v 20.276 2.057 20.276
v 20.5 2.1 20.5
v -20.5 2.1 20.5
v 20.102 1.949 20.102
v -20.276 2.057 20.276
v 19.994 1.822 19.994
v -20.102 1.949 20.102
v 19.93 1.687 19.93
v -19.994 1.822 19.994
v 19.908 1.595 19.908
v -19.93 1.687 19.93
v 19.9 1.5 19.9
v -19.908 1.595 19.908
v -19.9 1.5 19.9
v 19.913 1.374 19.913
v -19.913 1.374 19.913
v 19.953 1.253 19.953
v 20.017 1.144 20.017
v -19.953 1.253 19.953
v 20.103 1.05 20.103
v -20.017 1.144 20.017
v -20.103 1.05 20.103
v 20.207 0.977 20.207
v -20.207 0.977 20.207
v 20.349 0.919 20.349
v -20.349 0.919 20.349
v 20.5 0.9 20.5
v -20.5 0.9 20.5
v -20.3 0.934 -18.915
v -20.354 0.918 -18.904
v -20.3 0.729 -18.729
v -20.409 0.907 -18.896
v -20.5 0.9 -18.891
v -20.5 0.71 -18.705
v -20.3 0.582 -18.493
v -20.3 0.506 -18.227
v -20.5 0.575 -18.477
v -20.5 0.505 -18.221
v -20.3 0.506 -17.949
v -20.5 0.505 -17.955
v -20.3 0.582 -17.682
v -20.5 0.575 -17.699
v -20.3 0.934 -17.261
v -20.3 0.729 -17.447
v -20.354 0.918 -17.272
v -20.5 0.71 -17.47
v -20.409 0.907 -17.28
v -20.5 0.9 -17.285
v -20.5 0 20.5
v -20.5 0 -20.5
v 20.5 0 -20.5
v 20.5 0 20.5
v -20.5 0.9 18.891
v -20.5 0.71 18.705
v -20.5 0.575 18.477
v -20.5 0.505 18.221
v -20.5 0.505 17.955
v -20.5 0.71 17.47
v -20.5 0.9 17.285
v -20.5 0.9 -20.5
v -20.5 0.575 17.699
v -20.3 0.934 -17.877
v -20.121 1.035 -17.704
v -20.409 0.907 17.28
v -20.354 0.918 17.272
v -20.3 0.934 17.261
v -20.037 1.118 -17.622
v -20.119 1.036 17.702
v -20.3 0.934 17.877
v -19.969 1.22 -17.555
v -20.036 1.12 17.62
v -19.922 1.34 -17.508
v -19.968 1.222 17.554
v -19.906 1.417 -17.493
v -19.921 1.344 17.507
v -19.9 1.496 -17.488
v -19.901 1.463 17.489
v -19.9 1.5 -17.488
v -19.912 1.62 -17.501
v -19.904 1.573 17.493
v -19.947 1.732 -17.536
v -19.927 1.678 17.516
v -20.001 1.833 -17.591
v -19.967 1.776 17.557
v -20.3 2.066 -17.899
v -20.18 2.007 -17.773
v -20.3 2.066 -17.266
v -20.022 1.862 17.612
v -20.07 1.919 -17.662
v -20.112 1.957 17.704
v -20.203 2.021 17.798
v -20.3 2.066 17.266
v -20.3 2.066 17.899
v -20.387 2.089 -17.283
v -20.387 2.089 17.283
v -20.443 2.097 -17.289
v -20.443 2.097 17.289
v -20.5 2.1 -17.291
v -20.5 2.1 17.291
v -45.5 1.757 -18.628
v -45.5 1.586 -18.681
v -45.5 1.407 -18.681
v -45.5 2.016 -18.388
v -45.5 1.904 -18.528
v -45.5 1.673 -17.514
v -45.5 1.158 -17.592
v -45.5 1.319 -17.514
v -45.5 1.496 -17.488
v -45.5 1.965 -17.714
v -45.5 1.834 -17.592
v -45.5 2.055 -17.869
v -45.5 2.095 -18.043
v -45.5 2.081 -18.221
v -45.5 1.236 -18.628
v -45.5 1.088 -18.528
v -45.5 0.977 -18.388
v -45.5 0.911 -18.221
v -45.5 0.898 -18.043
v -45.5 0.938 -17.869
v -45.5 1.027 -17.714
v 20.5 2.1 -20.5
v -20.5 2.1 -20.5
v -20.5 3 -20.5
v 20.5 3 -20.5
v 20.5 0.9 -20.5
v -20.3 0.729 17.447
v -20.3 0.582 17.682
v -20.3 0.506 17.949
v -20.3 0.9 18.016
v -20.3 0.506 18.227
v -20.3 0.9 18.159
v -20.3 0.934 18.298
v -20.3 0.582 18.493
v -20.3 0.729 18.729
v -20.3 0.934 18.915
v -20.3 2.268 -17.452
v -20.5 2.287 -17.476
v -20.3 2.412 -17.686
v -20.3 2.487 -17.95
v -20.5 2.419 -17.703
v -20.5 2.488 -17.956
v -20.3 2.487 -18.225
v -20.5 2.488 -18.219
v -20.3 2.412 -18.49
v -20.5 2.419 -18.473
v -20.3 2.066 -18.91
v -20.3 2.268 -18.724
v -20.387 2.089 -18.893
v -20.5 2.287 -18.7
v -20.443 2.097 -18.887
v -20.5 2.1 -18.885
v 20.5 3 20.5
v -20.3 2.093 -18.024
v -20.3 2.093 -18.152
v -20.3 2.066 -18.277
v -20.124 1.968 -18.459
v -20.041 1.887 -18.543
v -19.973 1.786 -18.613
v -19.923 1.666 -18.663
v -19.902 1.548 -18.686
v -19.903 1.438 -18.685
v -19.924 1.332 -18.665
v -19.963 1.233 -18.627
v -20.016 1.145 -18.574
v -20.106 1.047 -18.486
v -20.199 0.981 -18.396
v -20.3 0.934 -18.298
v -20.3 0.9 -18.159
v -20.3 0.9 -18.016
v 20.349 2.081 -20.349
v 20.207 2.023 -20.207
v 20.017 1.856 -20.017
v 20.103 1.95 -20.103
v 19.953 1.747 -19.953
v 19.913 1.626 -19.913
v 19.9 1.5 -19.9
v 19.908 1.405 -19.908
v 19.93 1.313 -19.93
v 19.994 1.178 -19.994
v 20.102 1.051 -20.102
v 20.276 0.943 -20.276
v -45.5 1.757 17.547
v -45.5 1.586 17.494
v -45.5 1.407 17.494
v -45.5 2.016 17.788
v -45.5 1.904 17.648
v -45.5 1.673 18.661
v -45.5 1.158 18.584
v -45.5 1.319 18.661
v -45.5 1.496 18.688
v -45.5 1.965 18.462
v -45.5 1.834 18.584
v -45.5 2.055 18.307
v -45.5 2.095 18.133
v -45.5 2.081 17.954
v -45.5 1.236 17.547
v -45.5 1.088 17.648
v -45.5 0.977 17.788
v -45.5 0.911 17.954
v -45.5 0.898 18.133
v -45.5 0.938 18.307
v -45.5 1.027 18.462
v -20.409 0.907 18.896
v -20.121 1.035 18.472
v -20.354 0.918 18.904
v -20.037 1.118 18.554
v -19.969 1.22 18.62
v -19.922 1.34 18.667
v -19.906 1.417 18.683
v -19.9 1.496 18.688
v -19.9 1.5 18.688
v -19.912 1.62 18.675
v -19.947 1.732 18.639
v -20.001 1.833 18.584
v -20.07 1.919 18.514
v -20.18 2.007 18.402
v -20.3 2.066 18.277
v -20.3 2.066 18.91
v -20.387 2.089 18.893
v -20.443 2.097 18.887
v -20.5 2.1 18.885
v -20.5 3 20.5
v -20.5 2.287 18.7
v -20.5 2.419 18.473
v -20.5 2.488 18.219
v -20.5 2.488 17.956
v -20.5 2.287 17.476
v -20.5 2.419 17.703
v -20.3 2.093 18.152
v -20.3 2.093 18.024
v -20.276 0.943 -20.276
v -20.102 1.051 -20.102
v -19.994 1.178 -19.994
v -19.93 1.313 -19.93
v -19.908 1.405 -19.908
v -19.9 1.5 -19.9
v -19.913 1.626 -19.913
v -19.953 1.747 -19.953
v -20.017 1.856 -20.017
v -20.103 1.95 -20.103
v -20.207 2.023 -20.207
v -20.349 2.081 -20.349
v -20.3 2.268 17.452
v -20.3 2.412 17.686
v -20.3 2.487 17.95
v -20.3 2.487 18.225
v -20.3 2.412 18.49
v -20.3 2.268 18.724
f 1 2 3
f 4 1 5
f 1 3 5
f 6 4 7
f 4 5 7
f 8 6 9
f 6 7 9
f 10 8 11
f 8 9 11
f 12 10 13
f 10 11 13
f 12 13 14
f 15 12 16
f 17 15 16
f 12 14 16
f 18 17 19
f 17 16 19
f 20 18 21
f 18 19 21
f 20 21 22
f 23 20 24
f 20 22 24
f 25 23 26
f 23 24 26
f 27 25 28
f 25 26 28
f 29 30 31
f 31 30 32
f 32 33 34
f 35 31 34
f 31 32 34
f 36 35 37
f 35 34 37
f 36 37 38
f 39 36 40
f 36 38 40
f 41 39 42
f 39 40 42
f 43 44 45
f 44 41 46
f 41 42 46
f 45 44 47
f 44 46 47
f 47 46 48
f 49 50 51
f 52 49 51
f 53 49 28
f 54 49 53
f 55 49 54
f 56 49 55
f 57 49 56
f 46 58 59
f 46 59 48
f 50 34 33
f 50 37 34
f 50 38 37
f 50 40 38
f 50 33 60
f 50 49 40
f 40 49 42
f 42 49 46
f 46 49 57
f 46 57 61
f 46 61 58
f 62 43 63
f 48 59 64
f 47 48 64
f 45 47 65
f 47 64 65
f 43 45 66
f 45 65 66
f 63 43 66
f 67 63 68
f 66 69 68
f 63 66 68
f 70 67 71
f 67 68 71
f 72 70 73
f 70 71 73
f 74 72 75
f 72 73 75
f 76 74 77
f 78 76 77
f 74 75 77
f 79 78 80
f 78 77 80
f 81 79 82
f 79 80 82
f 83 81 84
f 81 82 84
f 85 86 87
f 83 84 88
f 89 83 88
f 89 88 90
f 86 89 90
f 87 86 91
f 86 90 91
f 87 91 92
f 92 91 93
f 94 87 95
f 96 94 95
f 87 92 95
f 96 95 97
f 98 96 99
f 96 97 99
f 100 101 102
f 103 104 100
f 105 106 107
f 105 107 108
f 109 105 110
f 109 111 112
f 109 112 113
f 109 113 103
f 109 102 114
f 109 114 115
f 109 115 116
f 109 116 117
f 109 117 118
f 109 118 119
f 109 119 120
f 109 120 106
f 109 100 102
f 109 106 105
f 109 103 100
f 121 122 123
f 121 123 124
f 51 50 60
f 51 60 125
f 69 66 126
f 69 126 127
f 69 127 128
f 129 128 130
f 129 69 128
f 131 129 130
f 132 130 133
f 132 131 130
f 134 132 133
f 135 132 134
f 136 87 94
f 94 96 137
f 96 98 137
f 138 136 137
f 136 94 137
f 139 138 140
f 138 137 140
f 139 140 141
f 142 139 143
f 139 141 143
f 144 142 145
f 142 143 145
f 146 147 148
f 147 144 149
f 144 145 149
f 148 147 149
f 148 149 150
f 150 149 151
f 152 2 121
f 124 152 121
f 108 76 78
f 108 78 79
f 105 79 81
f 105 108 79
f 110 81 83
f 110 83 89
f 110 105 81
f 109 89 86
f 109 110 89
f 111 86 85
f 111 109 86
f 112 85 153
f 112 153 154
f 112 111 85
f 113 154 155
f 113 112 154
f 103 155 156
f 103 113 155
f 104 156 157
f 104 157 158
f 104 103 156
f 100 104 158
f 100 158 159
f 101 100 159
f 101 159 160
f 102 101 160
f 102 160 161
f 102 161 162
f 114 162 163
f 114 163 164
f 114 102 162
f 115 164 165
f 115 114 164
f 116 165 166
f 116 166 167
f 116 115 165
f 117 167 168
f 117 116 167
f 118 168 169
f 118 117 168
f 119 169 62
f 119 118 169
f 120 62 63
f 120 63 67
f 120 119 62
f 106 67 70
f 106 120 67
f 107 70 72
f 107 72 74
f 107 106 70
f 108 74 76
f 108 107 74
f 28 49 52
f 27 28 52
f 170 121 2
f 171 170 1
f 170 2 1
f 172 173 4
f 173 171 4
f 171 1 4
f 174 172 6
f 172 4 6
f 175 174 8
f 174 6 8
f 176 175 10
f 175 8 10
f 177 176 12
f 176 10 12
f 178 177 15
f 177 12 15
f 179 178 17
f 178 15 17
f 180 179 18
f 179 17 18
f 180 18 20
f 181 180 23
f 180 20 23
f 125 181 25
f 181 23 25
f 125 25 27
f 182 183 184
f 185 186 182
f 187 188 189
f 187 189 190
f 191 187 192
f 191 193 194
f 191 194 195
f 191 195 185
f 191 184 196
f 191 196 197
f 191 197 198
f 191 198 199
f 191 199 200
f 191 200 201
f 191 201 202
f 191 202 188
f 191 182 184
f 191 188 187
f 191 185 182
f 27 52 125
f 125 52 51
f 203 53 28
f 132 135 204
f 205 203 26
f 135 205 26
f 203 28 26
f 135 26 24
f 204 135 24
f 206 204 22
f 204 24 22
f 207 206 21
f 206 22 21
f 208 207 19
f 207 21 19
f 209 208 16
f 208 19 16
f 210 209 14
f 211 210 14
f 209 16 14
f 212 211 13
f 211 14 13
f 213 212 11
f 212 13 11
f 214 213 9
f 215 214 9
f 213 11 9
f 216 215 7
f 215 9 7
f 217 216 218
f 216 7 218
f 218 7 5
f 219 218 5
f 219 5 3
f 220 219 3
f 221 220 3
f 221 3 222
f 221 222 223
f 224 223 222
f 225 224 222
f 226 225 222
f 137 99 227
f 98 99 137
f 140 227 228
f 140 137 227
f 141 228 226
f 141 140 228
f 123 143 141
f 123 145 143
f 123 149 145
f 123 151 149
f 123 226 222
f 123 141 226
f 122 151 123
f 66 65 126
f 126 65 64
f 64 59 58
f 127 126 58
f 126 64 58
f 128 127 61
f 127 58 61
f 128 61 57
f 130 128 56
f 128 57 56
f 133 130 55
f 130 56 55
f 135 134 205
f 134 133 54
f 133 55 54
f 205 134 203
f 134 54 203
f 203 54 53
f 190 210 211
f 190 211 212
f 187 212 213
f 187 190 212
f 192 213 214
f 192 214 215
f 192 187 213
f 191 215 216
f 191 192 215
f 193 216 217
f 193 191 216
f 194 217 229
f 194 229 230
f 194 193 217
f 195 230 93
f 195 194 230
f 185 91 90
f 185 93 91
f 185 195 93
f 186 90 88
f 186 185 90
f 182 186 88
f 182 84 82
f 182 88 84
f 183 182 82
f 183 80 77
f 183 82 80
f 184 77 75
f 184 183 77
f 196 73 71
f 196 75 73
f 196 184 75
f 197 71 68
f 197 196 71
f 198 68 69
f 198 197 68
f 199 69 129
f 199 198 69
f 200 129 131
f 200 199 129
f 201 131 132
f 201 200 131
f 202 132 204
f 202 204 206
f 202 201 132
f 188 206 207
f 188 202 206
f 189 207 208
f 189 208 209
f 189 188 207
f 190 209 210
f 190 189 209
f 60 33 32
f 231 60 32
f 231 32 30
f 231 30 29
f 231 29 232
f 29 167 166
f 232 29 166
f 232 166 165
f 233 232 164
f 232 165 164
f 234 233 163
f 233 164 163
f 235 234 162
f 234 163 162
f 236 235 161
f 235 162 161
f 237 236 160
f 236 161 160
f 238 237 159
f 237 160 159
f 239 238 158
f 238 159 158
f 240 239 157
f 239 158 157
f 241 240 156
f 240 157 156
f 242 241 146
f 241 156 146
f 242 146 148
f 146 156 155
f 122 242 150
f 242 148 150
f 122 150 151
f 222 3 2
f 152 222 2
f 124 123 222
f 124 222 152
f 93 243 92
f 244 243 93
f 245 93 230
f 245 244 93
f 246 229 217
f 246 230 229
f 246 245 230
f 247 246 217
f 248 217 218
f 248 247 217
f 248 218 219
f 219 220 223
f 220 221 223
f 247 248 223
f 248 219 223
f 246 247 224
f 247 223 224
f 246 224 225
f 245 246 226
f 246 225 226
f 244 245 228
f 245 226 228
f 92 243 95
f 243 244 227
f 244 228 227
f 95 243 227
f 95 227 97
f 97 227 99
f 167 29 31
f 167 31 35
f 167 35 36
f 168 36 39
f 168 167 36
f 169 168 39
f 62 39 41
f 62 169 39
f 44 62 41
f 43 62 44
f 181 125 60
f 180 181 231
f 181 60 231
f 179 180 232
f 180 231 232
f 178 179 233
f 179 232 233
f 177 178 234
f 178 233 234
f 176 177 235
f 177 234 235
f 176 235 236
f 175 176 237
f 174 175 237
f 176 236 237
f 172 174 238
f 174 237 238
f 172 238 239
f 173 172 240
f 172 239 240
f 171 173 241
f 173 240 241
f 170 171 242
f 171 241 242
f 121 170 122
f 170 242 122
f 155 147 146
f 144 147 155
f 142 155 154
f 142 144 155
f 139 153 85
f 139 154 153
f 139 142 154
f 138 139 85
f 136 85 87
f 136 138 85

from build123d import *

# Parameters (mm, degrees)
SKETCH2_W                = 41
SKETCH2_H                = 41
BOSS_EXTRUDE1_DEPTH      = 3
SKETCH3_R                = 1
CUT_EXTRUDE1_DEPTH       = 0.2
SKETCH4_R                = 0.6
CUT_EXTRUDE2_DEPTH       = 41
SKETCH5_R                = 0.6
CUT_EXTRUDE3_DEPTH       = 41
SKETCH6_R                = 0.6
BOSS_EXTRUDE2_DEPTH      = 25
BOSS_EXTRUDE2_DEPTH_BACK = 1


with BuildPart() as part:
    # Sketch2 → Boss-Extrude1 (new body)
    with BuildSketch(Plane(origin=(0, 0, 0), x_dir=(1, 0, 0), z_dir=(0, 1, 0))):
        Rectangle(SKETCH2_W, SKETCH2_H)
    extrude(amount=BOSS_EXTRUDE1_DEPTH)

    # Sketch3 → Cut-Extrude1 (cut)
    with BuildSketch(Plane.ZY.offset(20.5)):
        with Locations((-18.087798173, 1.496190707)):
            Circle(SKETCH3_R)
        with Locations((18.087798173, 1.496190707)):
            Circle(SKETCH3_R)
    extrude(amount=-CUT_EXTRUDE1_DEPTH, mode=Mode.SUBTRACT)

    # Sketch4 → Cut-Extrude2 (cut)
    with BuildSketch(Plane.ZY.offset(20.5)):
        with Locations((-20.5, 1.5)):
            Circle(SKETCH4_R)
        with Locations((20.5, 1.5)):
            Circle(SKETCH4_R)
    extrude(amount=-CUT_EXTRUDE2_DEPTH, mode=Mode.SUBTRACT)

    # Sketch5 → Cut-Extrude3 (cut)
    with BuildSketch(Plane.XY.offset(20.5)):
        with Locations((-20.5, 1.5)):
            Circle(SKETCH5_R)
        with Locations((20.5, 1.5)):
            Circle(SKETCH5_R)
    extrude(amount=-CUT_EXTRUDE3_DEPTH, mode=Mode.SUBTRACT)

    # Sketch6 → Boss-Extrude2 (add, two sides)
    with BuildSketch(Plane.ZY.offset(20.5)) as boss_extrude2_sk:
        with Locations((-18.087798173, 1.496190707)):
            Circle(SKETCH6_R)
        with Locations((18.087798173, 1.496190707)):
            Circle(SKETCH6_R)
    extrude(amount=BOSS_EXTRUDE2_DEPTH)
    extrude(boss_extrude2_sk.sketch, amount=-BOSS_EXTRUDE2_DEPTH_BACK)


solid = part.part
